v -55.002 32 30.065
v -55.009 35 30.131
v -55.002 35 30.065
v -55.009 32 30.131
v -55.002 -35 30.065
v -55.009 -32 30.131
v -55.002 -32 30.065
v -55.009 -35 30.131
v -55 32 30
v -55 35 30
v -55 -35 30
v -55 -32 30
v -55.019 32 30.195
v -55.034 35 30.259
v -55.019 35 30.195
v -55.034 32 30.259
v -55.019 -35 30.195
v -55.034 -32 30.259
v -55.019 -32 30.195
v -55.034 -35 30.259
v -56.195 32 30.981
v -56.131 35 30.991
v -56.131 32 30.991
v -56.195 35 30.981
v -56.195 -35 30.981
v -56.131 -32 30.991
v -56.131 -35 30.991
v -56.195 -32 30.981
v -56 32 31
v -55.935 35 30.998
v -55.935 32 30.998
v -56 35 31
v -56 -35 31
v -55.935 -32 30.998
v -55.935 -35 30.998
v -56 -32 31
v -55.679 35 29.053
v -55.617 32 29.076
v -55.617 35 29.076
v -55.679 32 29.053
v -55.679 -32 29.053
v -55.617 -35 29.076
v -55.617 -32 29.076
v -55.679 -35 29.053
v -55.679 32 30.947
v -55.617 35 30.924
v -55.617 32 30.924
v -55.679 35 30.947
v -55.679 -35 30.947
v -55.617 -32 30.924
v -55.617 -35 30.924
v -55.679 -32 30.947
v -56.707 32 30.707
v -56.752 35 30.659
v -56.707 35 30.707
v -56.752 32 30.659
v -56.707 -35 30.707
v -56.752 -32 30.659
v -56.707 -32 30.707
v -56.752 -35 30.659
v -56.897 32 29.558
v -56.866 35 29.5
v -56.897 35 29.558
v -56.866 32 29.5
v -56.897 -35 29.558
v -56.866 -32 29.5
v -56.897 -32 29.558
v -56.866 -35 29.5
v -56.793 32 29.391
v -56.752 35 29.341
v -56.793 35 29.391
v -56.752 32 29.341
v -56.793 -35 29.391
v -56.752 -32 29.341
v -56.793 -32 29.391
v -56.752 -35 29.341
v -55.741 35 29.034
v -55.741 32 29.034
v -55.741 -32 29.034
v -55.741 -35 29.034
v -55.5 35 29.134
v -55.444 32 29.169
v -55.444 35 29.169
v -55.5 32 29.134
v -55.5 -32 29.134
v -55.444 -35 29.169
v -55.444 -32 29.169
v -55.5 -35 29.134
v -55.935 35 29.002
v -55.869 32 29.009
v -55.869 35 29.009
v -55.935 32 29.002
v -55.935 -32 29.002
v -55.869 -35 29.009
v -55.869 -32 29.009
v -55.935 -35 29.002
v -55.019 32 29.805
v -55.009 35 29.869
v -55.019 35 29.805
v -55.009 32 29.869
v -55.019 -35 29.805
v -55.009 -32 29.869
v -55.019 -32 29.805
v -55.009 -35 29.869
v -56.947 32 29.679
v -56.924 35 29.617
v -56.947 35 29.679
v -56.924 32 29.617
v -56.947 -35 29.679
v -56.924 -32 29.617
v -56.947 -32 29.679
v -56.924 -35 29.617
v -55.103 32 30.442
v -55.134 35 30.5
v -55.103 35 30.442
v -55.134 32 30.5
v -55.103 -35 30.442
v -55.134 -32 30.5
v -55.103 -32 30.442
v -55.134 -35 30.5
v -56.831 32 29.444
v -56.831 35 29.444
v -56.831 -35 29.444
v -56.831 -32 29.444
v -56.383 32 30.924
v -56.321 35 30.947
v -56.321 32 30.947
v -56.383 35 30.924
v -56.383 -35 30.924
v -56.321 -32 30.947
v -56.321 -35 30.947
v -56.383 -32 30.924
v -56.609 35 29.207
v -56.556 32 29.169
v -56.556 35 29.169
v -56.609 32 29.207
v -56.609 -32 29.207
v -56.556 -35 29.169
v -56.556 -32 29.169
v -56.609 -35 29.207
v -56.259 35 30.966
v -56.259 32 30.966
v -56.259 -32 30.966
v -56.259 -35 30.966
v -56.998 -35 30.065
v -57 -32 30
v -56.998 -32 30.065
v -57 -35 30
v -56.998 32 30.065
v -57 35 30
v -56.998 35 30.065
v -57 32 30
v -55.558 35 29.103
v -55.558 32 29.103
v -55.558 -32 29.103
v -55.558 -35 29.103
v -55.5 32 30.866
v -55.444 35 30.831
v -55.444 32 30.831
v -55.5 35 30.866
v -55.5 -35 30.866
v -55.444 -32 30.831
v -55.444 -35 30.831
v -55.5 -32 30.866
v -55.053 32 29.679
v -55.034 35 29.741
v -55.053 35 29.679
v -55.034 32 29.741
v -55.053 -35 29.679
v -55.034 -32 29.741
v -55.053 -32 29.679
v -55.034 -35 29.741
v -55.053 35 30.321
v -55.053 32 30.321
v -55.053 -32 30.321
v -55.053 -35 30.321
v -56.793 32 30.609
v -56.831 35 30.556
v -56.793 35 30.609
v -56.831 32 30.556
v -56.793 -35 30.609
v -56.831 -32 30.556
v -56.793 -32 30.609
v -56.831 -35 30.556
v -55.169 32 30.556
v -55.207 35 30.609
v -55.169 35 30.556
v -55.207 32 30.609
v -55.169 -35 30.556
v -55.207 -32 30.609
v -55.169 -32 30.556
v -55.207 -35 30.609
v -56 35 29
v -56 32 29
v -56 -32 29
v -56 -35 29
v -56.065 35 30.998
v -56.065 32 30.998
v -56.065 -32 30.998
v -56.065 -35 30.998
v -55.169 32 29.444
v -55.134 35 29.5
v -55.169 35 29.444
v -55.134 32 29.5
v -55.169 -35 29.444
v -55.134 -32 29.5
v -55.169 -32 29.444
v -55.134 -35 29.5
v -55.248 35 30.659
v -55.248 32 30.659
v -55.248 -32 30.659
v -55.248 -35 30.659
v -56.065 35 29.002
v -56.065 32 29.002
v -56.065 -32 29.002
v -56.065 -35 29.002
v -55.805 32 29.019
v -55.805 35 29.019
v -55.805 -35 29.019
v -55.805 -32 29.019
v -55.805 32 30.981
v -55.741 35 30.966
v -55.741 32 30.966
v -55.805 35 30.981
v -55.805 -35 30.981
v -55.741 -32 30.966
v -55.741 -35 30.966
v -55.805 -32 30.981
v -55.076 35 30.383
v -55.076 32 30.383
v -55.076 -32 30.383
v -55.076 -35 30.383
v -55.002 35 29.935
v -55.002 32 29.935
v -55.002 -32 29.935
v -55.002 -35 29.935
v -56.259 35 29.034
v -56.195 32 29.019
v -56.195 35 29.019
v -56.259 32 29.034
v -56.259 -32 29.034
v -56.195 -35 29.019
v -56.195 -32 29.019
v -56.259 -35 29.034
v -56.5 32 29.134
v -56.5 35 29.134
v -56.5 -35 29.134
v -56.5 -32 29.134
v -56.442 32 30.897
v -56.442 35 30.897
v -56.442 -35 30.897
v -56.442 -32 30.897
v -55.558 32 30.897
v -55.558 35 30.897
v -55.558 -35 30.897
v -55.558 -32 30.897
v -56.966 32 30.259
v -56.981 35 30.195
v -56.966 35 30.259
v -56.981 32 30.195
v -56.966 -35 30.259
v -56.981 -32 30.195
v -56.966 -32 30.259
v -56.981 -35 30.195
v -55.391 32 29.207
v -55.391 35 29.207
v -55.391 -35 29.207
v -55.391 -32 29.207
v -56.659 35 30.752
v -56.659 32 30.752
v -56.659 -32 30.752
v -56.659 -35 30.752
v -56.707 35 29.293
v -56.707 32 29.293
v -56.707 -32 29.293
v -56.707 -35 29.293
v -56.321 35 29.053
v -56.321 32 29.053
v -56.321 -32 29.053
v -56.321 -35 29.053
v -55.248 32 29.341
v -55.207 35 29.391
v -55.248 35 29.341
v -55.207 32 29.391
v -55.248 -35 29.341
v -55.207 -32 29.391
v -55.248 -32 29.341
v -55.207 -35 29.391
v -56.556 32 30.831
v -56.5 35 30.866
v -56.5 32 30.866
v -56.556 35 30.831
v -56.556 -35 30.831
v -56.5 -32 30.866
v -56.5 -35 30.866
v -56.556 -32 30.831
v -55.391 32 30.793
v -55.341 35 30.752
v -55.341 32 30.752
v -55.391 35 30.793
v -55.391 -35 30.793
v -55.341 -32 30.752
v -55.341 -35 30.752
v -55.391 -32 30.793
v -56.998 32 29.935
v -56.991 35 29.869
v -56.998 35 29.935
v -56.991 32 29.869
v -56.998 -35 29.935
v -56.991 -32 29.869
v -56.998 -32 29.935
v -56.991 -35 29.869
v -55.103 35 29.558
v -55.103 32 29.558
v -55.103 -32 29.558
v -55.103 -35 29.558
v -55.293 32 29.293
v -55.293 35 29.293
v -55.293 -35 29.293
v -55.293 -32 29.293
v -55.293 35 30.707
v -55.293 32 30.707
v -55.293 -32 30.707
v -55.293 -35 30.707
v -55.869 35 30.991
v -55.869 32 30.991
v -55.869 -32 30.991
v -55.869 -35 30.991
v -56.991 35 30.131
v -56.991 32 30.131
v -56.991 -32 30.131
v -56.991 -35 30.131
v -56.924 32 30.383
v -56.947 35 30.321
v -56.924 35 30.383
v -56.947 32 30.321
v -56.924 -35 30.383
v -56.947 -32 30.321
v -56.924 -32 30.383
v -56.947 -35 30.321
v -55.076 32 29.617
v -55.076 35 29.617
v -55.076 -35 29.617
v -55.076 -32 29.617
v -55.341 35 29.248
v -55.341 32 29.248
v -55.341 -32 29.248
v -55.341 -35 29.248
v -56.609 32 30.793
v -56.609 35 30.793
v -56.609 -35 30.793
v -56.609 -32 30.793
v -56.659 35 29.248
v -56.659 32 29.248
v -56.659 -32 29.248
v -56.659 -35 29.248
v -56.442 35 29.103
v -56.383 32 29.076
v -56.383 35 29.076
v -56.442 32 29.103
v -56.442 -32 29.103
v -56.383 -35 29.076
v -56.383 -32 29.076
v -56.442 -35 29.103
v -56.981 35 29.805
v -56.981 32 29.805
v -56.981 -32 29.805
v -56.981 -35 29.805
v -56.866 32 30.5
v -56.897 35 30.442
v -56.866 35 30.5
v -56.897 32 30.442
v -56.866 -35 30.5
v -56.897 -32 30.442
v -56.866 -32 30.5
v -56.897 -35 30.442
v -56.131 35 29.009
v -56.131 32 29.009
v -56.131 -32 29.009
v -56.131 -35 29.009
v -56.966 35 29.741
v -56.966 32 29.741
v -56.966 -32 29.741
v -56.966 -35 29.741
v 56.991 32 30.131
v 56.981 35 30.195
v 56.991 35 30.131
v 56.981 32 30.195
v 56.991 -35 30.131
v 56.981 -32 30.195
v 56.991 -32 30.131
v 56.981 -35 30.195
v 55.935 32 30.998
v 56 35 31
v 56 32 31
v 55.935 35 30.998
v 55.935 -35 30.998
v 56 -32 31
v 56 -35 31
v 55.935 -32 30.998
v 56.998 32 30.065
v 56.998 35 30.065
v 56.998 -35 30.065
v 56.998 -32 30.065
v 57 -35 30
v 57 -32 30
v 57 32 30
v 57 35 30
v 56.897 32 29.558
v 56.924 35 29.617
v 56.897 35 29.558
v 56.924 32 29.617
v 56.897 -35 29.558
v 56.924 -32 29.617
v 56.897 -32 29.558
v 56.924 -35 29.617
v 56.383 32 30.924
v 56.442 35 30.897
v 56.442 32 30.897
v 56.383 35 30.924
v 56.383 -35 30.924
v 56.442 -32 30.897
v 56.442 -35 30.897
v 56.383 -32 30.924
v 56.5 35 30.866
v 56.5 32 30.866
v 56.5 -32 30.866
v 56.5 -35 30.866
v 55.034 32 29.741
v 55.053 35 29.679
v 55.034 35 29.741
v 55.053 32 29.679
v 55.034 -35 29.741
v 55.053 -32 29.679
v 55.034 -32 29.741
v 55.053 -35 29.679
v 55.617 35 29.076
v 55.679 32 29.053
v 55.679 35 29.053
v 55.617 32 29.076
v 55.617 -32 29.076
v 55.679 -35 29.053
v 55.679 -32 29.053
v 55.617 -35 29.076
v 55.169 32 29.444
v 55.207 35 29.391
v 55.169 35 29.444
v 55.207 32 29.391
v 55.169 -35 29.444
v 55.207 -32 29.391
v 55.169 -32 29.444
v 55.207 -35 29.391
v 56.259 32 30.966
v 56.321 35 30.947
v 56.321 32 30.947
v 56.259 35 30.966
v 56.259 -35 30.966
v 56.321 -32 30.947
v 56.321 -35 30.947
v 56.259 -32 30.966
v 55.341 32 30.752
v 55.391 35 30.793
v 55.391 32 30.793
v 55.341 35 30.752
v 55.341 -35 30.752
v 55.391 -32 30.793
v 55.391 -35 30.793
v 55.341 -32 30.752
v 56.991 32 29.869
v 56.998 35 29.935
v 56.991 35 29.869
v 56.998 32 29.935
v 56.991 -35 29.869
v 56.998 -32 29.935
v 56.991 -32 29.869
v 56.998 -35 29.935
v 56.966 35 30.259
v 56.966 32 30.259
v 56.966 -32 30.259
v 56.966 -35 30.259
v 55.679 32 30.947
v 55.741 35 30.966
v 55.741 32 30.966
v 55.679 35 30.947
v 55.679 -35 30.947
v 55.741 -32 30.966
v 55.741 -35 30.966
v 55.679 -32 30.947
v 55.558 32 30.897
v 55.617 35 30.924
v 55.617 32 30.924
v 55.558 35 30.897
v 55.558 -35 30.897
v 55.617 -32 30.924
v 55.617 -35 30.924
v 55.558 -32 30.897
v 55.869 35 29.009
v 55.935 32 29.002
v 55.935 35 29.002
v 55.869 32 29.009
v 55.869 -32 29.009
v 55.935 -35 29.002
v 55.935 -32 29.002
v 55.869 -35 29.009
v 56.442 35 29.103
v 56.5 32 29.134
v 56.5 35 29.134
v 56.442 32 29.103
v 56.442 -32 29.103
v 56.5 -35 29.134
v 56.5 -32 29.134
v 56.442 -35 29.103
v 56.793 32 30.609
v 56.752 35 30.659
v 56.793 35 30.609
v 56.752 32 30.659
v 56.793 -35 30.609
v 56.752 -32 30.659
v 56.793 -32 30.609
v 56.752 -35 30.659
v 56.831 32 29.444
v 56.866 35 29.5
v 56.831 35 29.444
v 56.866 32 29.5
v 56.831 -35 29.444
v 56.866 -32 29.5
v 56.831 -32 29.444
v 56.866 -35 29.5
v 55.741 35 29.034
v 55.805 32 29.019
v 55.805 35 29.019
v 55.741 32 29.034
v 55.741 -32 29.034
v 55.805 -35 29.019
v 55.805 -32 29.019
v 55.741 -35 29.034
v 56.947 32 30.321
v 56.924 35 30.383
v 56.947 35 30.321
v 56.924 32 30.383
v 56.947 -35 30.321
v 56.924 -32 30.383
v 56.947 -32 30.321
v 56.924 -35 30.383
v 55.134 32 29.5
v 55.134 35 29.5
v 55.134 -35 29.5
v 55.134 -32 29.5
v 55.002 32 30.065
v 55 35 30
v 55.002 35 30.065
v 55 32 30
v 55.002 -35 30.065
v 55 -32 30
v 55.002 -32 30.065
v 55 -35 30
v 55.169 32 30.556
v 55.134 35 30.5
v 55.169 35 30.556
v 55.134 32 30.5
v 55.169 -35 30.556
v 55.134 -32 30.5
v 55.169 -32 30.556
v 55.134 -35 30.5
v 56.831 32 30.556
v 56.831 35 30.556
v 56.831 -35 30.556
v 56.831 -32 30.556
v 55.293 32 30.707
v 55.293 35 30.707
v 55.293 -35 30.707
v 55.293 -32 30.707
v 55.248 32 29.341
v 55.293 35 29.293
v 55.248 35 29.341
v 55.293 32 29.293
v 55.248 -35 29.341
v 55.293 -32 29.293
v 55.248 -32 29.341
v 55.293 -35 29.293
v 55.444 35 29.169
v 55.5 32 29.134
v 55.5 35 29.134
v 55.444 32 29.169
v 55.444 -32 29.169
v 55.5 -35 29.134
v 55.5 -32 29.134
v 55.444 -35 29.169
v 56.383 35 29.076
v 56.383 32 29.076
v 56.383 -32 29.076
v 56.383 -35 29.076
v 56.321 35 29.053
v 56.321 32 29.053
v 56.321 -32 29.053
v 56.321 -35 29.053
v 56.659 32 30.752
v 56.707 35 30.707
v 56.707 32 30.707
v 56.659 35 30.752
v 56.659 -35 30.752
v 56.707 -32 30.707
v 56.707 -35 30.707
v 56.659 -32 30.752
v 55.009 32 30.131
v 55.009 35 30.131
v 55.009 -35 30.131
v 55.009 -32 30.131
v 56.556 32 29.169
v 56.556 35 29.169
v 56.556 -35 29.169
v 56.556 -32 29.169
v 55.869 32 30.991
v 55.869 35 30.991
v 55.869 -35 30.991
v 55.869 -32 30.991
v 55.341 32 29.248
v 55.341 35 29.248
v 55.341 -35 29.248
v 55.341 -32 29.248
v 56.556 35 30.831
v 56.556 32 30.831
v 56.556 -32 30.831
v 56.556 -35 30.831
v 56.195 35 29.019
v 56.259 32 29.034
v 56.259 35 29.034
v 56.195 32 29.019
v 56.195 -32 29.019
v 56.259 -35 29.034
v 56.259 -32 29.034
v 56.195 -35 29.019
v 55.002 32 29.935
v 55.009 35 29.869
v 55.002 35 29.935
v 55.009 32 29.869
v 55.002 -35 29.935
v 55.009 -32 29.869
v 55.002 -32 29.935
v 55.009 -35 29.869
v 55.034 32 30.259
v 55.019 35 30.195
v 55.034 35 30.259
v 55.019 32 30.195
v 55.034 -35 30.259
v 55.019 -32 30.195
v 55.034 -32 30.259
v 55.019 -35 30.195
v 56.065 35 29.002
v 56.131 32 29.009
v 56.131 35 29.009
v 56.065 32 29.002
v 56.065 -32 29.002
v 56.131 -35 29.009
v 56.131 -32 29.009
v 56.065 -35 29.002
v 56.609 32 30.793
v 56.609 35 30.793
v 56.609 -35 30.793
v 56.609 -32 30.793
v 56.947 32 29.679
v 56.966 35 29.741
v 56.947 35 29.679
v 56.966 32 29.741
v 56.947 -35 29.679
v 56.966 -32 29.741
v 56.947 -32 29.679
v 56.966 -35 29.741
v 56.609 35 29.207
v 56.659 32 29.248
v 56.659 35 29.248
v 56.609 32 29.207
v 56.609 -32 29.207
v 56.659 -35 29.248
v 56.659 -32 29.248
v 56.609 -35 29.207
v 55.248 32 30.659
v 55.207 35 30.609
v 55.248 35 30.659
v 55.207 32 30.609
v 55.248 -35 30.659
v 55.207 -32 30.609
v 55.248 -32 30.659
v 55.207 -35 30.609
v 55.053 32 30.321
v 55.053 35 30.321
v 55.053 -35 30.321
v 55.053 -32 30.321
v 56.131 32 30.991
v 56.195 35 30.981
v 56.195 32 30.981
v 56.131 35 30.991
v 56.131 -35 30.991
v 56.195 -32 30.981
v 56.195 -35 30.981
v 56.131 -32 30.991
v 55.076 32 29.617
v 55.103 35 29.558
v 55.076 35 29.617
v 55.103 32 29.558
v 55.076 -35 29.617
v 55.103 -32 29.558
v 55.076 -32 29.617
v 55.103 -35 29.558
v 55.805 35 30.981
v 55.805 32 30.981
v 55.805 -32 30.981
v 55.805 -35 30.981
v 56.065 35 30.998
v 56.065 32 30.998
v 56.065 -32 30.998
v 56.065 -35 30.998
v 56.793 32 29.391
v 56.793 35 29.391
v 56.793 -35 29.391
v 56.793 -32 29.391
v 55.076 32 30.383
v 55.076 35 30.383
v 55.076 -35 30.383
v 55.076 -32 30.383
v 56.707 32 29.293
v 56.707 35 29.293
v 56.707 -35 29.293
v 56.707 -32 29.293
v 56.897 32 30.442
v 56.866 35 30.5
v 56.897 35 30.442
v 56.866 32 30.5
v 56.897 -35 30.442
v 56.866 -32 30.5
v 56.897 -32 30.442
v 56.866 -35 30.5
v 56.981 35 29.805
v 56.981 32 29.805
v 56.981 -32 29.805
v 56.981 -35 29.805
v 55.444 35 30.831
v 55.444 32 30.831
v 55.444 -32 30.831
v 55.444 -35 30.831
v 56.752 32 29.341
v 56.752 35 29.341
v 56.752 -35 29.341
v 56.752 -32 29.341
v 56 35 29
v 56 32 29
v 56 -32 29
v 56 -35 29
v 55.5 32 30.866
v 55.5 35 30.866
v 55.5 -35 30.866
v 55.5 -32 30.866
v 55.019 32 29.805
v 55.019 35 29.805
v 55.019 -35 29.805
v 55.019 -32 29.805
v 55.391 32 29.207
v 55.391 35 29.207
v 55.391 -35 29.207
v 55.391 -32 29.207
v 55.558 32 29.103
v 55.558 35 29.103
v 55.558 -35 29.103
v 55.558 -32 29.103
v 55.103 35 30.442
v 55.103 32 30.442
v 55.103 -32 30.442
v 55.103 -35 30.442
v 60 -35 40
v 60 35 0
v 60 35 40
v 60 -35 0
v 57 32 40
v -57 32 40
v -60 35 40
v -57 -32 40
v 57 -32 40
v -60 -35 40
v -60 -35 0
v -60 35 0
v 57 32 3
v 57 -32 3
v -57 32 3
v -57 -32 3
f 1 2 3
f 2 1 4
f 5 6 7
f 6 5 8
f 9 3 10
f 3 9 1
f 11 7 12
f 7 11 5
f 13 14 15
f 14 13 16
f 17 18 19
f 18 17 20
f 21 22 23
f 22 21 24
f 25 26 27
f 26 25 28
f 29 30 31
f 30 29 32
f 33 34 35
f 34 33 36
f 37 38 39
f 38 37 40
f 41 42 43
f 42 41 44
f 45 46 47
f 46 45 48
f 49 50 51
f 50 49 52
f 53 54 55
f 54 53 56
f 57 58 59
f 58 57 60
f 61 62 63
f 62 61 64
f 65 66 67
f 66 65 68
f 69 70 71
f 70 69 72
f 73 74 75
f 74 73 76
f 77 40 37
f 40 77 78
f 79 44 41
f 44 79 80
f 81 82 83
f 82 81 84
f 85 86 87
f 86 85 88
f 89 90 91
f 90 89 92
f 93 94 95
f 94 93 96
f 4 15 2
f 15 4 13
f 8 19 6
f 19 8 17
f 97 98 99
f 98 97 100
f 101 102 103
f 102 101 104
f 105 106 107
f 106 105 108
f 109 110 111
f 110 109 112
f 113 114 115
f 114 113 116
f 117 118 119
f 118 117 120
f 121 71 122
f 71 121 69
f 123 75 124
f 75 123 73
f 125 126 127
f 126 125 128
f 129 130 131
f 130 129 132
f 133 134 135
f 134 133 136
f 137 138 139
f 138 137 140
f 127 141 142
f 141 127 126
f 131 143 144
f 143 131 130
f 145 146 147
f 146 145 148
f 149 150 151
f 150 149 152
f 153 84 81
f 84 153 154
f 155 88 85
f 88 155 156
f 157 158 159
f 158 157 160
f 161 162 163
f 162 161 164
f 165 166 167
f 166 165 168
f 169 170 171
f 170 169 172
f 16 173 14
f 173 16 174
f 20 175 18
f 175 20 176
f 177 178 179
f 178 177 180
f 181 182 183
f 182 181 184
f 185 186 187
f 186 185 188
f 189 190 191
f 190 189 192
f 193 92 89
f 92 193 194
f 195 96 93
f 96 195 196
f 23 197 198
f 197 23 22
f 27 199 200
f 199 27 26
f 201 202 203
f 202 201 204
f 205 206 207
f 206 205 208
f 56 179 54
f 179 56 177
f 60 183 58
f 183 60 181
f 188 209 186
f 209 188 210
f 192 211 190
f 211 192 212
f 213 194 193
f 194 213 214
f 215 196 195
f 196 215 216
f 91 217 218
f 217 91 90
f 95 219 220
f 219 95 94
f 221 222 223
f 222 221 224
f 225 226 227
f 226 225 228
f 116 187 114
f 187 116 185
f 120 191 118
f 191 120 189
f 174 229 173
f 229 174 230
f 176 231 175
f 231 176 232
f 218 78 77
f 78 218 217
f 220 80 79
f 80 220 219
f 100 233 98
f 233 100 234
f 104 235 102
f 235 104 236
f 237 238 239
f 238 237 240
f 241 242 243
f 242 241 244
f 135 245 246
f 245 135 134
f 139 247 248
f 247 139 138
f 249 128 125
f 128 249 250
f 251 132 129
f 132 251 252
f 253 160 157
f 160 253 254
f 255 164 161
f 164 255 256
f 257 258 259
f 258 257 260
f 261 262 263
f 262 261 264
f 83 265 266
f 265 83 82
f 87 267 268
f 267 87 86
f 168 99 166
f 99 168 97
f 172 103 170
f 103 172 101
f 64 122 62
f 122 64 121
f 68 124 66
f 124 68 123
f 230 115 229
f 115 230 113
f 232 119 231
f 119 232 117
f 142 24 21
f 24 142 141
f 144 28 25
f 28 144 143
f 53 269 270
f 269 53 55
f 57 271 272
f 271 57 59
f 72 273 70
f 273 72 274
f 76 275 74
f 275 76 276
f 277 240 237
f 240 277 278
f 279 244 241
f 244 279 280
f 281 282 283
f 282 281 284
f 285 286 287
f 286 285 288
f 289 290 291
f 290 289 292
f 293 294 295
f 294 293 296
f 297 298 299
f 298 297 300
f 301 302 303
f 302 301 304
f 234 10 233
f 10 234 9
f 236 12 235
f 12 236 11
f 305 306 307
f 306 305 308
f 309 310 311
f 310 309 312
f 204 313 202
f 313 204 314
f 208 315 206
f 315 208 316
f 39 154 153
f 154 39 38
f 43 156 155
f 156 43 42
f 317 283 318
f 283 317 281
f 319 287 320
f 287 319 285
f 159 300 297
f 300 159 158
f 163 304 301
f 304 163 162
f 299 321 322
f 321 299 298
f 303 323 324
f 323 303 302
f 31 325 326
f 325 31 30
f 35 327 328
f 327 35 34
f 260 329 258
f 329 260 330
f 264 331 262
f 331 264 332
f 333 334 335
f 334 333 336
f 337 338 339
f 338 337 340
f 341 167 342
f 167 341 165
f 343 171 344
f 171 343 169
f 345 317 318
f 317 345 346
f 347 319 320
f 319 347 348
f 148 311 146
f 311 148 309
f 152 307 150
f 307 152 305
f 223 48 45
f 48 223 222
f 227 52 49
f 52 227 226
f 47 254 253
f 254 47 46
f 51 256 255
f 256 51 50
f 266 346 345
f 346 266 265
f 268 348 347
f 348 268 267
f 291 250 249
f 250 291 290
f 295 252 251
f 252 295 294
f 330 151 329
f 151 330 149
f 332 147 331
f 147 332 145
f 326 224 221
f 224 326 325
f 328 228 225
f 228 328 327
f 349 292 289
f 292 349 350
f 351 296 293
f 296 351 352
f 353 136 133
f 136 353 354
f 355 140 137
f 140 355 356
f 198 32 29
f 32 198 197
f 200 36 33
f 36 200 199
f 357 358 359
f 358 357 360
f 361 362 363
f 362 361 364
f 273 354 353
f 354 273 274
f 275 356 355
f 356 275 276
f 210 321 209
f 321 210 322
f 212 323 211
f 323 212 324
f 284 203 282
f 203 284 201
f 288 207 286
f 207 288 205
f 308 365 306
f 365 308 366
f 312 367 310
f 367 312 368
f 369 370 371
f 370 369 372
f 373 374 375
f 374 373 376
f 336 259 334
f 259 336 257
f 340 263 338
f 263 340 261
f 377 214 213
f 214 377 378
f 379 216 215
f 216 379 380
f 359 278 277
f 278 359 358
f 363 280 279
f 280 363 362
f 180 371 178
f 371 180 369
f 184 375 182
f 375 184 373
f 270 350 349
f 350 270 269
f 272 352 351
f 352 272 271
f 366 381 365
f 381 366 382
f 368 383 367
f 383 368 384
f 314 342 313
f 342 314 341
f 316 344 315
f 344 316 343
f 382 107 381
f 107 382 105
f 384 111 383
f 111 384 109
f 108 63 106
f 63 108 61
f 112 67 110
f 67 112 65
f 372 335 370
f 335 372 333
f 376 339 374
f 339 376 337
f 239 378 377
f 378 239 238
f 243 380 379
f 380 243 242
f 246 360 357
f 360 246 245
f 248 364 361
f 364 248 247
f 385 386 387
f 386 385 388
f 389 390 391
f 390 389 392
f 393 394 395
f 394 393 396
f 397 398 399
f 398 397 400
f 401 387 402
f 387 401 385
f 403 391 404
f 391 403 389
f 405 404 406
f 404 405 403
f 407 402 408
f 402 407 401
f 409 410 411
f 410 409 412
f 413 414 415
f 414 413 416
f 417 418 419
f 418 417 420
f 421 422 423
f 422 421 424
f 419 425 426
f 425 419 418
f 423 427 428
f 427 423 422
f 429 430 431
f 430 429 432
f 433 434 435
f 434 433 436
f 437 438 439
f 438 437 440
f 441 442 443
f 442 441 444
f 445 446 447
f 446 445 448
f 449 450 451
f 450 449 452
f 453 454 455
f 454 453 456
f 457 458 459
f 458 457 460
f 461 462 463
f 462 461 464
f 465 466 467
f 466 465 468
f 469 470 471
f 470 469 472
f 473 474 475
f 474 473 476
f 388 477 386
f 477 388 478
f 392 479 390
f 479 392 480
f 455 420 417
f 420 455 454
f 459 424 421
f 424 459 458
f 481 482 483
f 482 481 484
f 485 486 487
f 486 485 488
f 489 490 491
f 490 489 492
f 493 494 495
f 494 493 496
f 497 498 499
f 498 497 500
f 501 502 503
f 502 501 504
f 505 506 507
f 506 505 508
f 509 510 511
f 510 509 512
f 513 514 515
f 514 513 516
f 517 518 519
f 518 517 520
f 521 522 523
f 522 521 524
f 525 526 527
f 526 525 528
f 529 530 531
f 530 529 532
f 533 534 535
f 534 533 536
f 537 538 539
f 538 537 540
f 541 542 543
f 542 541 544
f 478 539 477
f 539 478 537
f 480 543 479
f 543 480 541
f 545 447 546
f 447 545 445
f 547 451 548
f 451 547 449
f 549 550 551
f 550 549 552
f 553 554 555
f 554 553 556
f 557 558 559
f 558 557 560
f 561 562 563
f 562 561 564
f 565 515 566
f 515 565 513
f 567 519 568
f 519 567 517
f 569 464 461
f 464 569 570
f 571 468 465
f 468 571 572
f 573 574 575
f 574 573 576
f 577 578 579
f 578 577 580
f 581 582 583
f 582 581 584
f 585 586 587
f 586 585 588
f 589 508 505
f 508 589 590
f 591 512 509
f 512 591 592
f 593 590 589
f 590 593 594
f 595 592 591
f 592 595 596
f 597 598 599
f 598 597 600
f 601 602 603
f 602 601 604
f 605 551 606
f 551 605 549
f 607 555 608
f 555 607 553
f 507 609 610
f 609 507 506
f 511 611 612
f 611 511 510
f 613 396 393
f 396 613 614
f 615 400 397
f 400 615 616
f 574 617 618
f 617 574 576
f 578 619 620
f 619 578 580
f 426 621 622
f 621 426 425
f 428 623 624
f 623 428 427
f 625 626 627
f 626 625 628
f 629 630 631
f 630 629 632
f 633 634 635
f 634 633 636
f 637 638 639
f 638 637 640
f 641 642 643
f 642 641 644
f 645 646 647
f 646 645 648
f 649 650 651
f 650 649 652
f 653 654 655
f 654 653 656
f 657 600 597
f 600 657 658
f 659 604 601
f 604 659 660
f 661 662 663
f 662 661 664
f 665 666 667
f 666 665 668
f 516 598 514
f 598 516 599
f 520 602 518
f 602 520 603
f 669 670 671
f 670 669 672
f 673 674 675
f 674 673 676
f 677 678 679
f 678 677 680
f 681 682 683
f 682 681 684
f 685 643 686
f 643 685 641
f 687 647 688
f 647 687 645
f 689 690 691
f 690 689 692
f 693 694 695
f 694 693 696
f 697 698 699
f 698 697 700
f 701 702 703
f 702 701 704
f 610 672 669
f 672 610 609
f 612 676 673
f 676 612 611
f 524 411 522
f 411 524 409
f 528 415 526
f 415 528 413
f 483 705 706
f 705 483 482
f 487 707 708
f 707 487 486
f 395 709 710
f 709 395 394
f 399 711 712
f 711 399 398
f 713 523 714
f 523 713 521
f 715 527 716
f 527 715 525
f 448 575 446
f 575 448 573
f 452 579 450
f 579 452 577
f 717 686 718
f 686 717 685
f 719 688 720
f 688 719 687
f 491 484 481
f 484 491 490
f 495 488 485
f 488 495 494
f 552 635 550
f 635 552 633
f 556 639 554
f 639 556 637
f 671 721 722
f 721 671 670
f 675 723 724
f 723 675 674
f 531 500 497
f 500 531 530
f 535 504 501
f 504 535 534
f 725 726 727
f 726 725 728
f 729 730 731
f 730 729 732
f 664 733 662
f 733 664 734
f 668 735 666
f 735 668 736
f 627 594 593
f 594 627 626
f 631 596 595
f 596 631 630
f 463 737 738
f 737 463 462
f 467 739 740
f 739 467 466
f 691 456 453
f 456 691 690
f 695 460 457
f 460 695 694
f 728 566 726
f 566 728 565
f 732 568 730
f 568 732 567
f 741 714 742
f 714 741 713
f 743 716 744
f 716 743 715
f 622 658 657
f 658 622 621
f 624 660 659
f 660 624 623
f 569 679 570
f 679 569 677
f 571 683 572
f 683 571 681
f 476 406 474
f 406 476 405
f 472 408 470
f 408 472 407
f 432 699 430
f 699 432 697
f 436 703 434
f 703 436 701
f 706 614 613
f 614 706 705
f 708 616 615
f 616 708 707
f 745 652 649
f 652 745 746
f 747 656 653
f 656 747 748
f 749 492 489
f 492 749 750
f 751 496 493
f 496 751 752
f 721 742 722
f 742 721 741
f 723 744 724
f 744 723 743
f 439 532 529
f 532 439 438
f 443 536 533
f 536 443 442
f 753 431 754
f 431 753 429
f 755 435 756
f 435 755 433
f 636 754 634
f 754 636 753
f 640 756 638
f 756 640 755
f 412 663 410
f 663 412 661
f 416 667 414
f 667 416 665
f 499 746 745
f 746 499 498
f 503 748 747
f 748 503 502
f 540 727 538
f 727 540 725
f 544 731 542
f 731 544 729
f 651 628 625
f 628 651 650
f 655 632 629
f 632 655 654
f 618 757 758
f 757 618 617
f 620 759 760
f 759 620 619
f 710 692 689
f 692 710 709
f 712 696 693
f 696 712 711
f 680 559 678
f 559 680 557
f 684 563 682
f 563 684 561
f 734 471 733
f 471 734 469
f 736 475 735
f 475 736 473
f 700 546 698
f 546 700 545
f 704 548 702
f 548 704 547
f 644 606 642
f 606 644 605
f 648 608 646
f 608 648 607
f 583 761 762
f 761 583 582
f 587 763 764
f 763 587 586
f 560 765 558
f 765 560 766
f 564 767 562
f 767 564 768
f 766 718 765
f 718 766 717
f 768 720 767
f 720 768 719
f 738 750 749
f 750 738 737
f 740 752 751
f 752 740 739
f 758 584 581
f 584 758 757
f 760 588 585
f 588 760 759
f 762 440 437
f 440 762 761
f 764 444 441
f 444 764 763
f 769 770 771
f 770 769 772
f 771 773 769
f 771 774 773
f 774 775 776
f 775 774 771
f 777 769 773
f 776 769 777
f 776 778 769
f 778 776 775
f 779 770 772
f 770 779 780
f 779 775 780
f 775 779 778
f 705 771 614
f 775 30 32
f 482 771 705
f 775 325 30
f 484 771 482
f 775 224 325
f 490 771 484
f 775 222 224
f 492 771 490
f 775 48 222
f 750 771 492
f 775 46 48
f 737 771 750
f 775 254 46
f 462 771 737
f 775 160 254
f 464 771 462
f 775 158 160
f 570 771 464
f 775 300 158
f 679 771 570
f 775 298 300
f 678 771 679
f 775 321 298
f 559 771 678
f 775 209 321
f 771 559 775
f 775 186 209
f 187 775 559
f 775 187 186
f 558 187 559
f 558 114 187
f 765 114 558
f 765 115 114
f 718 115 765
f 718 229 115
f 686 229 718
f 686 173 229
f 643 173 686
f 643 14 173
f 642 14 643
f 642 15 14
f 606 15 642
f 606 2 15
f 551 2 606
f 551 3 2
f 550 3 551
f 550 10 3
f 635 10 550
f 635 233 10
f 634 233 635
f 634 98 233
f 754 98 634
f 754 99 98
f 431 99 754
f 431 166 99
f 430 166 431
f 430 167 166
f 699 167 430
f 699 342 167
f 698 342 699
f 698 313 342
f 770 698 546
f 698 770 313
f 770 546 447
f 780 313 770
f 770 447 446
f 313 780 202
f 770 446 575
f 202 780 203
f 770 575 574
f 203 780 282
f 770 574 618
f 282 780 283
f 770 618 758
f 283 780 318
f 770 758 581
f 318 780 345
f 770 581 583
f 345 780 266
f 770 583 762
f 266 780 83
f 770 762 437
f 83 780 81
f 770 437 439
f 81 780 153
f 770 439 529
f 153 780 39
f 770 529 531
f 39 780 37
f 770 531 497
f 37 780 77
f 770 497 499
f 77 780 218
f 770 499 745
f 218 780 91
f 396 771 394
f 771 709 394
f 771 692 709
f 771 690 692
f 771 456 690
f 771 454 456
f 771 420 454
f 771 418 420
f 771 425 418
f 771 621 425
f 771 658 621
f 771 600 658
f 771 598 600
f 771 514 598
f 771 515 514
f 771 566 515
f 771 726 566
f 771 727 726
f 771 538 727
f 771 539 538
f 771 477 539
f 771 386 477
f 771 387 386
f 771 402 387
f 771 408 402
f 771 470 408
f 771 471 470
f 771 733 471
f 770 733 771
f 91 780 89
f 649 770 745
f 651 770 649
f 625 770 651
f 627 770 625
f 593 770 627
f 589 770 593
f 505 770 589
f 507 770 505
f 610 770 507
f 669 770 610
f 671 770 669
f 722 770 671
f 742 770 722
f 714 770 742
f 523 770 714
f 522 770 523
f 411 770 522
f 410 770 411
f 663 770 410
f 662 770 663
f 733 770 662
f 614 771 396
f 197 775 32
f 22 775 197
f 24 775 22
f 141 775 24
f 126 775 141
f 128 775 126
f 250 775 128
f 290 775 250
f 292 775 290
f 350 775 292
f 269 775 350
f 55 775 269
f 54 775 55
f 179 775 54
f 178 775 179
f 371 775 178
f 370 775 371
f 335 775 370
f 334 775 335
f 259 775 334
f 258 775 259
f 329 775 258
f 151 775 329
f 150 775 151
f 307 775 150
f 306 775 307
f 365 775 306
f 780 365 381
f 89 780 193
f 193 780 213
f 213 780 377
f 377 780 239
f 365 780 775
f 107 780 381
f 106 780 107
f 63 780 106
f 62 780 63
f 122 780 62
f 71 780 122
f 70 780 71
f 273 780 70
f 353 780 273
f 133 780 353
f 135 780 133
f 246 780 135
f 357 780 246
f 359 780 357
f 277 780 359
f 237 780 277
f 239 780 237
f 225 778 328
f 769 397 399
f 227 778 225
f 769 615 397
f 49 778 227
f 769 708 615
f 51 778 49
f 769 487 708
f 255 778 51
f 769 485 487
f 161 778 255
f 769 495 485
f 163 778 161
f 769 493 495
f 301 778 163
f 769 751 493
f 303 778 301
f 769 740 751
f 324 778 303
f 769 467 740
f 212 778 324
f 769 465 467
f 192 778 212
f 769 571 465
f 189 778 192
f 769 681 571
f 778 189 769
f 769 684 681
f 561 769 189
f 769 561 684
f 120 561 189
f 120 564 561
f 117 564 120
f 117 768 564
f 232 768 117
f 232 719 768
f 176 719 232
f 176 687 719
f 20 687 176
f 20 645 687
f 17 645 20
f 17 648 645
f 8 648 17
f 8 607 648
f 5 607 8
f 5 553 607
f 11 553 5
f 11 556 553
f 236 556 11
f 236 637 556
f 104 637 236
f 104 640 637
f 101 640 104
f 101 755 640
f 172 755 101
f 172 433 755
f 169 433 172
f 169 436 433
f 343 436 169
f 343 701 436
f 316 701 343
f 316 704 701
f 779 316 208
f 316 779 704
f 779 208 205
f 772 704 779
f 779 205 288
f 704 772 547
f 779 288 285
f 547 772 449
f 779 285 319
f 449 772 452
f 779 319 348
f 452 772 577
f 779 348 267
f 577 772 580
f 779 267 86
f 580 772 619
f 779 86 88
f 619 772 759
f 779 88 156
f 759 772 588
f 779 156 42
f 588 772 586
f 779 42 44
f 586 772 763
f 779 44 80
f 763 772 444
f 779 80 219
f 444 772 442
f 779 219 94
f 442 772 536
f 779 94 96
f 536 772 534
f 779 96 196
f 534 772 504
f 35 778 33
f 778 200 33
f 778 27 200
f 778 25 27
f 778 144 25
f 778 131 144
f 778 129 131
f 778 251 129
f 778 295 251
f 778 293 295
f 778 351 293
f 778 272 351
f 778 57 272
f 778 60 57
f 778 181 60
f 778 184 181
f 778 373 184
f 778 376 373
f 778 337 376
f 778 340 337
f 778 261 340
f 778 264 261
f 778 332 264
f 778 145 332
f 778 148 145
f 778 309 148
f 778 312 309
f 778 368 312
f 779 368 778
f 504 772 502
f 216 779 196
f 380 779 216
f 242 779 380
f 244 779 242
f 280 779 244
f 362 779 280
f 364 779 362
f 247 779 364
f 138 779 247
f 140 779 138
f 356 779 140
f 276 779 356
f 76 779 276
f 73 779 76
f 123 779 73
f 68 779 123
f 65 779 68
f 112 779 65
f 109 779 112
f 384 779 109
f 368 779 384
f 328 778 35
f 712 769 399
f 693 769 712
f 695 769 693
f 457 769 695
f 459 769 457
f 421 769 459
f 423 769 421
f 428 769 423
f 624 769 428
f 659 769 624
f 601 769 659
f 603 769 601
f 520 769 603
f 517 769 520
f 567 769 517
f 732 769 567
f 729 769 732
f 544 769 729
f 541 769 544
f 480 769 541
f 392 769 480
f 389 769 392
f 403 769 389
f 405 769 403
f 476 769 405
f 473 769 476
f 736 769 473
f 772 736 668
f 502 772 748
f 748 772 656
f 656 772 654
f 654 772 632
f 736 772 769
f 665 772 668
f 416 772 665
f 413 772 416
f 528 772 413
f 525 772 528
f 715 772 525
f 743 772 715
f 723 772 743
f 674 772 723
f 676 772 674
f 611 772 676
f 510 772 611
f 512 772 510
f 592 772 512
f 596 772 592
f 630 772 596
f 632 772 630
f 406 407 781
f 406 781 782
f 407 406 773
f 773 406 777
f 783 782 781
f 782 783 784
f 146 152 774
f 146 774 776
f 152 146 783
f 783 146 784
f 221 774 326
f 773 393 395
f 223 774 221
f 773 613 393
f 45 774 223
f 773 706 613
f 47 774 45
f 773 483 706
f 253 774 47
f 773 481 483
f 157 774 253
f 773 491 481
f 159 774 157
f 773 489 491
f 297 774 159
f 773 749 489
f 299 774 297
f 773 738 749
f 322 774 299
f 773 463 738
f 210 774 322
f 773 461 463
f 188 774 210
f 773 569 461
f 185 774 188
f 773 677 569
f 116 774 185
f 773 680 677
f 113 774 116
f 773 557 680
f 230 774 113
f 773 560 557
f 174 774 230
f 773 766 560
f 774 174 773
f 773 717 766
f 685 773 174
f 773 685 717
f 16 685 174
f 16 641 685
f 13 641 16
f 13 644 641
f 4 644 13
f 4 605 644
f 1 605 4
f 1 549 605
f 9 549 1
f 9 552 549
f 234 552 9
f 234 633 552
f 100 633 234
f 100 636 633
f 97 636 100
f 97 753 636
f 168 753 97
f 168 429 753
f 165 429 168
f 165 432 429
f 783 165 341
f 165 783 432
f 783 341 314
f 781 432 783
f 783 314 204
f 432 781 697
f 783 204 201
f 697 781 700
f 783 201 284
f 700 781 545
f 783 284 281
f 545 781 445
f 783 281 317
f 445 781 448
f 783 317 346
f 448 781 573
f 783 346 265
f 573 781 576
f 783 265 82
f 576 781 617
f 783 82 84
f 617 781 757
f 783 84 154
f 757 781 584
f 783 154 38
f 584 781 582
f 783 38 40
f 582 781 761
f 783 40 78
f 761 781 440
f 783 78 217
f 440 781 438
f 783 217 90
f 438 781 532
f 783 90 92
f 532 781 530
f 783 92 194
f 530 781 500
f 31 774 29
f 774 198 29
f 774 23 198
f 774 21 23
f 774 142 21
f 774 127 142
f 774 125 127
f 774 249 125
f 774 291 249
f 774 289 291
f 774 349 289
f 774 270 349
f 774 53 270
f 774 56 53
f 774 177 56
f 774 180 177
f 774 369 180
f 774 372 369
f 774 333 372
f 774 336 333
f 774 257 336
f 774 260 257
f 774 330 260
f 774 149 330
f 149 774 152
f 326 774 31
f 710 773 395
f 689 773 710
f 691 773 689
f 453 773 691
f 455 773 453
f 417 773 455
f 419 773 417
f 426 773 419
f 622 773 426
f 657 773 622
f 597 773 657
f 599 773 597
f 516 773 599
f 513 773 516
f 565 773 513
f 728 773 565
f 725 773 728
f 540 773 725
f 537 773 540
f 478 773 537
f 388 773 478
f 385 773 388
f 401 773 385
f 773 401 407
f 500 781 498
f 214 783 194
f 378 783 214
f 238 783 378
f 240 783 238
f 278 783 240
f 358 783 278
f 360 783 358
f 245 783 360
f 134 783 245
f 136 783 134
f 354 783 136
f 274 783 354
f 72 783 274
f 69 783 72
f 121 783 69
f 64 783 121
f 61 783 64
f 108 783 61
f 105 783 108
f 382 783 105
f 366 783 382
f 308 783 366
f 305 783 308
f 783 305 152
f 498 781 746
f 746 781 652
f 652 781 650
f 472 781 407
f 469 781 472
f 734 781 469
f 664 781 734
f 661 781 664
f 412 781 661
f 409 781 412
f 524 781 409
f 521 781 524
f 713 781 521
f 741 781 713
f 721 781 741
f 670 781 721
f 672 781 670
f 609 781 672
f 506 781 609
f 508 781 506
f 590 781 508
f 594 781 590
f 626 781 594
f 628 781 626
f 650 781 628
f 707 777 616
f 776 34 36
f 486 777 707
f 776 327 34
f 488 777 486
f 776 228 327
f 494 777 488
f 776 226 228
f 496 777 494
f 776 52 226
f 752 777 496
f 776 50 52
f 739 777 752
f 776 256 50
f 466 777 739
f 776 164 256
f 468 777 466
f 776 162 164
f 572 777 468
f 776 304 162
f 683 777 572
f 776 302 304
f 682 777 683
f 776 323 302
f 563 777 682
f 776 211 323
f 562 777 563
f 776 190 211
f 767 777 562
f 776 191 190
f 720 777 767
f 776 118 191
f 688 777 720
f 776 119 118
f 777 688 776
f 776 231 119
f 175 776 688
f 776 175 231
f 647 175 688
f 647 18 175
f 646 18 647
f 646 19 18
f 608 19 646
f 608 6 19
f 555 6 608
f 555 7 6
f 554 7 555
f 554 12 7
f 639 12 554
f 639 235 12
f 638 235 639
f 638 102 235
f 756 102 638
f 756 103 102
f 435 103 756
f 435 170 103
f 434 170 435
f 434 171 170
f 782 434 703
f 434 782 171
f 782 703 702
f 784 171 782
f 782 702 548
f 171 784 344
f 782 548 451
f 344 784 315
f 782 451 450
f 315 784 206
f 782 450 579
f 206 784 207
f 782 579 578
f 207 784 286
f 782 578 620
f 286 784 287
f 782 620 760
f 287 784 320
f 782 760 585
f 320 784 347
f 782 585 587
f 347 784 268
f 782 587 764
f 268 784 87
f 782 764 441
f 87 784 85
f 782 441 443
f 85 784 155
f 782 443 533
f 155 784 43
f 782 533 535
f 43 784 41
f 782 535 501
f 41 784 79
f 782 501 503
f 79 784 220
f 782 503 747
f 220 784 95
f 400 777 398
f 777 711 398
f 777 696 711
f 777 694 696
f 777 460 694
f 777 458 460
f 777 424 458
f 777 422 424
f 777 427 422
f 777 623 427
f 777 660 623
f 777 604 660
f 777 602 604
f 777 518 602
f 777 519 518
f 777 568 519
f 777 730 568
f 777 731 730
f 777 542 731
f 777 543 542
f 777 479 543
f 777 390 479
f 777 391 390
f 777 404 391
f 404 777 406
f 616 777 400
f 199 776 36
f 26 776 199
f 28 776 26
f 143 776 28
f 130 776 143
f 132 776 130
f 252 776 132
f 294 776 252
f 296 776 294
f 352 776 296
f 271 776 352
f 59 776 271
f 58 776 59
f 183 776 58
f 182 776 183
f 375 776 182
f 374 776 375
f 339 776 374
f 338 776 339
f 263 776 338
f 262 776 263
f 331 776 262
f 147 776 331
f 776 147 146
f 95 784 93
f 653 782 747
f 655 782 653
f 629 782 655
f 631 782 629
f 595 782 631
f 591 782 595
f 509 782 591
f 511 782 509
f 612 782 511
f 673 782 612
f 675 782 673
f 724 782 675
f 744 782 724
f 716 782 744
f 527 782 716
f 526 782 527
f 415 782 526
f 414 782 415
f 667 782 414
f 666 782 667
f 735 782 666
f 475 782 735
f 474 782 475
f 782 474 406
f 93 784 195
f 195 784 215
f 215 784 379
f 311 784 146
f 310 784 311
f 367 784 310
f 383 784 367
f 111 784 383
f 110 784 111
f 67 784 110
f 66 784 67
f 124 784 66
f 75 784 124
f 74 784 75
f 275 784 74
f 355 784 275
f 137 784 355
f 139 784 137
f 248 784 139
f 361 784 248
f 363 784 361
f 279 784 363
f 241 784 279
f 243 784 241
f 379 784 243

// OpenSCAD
// Mini horizontal gel-electrophoresis box - buffer tank
// Print orientation: tank base on XY plane, opening upward (+Z)

// ---------------- Parameters ----------------
outer_x      = 120;   // outer tank length (X)
outer_y      = 70;    // outer tank width (Y)
tank_h       = 40;    // overall tank height (Z)
wall         = 3;     // wall thickness
floor        = 3;     // floor thickness (solid bottom)

platform_len = 60;    // gel tray platform length (X)
platform_r   = 35;    // gel tray platform width (Y) - full inner width
plat_top_z   = 13;    // platform top height (3 mm floor + 10 mm rise)

hole_d       = 2;     // electrode wire hole diameter
hole_y       = 0;     // hole centre Y position
hole_z       = 30;    // hole centre Z position

eps          = 0.5;   // cutter overshoot past faces

$fn = 96;

// ---------------- Derived ----------------
inner_x = outer_x - 2 * wall;     // 114
inner_y = outer_y - 2 * wall;     // 64
floor_t = floor;                  // solid floor thickness

// ---------------- Model ----------------
difference() {
    // Main tank body (outer dimensions)
    translate([-outer_x / 2, -outer_y / 2, 0])
        cube([outer_x, outer_y, tank_h]);

    // Open top (hollow out above floor level)
    translate([-inner_x / 2, -inner_y / 2, floor_t])
        cube([inner_x, inner_y, tank_h - floor_t + eps]);

    // Gel tray platform - spans full inner width, centred in X
    translate([-platform_len / 2, -platform_r / 2, floor_t])
        cube([platform_len, platform_r, plat_top_z - floor_t + 0.01]);

    // Electrode wire holes through each end wall along X
    for (sx = [-1, 1])
        translate([sx * (inner_x / 2 - hole_d / 2), hole_y, hole_z])
            rotate([90, 0, 0])
                cylinder(d = hole_d, h = outer_y + 2 * eps, center = true);
}
